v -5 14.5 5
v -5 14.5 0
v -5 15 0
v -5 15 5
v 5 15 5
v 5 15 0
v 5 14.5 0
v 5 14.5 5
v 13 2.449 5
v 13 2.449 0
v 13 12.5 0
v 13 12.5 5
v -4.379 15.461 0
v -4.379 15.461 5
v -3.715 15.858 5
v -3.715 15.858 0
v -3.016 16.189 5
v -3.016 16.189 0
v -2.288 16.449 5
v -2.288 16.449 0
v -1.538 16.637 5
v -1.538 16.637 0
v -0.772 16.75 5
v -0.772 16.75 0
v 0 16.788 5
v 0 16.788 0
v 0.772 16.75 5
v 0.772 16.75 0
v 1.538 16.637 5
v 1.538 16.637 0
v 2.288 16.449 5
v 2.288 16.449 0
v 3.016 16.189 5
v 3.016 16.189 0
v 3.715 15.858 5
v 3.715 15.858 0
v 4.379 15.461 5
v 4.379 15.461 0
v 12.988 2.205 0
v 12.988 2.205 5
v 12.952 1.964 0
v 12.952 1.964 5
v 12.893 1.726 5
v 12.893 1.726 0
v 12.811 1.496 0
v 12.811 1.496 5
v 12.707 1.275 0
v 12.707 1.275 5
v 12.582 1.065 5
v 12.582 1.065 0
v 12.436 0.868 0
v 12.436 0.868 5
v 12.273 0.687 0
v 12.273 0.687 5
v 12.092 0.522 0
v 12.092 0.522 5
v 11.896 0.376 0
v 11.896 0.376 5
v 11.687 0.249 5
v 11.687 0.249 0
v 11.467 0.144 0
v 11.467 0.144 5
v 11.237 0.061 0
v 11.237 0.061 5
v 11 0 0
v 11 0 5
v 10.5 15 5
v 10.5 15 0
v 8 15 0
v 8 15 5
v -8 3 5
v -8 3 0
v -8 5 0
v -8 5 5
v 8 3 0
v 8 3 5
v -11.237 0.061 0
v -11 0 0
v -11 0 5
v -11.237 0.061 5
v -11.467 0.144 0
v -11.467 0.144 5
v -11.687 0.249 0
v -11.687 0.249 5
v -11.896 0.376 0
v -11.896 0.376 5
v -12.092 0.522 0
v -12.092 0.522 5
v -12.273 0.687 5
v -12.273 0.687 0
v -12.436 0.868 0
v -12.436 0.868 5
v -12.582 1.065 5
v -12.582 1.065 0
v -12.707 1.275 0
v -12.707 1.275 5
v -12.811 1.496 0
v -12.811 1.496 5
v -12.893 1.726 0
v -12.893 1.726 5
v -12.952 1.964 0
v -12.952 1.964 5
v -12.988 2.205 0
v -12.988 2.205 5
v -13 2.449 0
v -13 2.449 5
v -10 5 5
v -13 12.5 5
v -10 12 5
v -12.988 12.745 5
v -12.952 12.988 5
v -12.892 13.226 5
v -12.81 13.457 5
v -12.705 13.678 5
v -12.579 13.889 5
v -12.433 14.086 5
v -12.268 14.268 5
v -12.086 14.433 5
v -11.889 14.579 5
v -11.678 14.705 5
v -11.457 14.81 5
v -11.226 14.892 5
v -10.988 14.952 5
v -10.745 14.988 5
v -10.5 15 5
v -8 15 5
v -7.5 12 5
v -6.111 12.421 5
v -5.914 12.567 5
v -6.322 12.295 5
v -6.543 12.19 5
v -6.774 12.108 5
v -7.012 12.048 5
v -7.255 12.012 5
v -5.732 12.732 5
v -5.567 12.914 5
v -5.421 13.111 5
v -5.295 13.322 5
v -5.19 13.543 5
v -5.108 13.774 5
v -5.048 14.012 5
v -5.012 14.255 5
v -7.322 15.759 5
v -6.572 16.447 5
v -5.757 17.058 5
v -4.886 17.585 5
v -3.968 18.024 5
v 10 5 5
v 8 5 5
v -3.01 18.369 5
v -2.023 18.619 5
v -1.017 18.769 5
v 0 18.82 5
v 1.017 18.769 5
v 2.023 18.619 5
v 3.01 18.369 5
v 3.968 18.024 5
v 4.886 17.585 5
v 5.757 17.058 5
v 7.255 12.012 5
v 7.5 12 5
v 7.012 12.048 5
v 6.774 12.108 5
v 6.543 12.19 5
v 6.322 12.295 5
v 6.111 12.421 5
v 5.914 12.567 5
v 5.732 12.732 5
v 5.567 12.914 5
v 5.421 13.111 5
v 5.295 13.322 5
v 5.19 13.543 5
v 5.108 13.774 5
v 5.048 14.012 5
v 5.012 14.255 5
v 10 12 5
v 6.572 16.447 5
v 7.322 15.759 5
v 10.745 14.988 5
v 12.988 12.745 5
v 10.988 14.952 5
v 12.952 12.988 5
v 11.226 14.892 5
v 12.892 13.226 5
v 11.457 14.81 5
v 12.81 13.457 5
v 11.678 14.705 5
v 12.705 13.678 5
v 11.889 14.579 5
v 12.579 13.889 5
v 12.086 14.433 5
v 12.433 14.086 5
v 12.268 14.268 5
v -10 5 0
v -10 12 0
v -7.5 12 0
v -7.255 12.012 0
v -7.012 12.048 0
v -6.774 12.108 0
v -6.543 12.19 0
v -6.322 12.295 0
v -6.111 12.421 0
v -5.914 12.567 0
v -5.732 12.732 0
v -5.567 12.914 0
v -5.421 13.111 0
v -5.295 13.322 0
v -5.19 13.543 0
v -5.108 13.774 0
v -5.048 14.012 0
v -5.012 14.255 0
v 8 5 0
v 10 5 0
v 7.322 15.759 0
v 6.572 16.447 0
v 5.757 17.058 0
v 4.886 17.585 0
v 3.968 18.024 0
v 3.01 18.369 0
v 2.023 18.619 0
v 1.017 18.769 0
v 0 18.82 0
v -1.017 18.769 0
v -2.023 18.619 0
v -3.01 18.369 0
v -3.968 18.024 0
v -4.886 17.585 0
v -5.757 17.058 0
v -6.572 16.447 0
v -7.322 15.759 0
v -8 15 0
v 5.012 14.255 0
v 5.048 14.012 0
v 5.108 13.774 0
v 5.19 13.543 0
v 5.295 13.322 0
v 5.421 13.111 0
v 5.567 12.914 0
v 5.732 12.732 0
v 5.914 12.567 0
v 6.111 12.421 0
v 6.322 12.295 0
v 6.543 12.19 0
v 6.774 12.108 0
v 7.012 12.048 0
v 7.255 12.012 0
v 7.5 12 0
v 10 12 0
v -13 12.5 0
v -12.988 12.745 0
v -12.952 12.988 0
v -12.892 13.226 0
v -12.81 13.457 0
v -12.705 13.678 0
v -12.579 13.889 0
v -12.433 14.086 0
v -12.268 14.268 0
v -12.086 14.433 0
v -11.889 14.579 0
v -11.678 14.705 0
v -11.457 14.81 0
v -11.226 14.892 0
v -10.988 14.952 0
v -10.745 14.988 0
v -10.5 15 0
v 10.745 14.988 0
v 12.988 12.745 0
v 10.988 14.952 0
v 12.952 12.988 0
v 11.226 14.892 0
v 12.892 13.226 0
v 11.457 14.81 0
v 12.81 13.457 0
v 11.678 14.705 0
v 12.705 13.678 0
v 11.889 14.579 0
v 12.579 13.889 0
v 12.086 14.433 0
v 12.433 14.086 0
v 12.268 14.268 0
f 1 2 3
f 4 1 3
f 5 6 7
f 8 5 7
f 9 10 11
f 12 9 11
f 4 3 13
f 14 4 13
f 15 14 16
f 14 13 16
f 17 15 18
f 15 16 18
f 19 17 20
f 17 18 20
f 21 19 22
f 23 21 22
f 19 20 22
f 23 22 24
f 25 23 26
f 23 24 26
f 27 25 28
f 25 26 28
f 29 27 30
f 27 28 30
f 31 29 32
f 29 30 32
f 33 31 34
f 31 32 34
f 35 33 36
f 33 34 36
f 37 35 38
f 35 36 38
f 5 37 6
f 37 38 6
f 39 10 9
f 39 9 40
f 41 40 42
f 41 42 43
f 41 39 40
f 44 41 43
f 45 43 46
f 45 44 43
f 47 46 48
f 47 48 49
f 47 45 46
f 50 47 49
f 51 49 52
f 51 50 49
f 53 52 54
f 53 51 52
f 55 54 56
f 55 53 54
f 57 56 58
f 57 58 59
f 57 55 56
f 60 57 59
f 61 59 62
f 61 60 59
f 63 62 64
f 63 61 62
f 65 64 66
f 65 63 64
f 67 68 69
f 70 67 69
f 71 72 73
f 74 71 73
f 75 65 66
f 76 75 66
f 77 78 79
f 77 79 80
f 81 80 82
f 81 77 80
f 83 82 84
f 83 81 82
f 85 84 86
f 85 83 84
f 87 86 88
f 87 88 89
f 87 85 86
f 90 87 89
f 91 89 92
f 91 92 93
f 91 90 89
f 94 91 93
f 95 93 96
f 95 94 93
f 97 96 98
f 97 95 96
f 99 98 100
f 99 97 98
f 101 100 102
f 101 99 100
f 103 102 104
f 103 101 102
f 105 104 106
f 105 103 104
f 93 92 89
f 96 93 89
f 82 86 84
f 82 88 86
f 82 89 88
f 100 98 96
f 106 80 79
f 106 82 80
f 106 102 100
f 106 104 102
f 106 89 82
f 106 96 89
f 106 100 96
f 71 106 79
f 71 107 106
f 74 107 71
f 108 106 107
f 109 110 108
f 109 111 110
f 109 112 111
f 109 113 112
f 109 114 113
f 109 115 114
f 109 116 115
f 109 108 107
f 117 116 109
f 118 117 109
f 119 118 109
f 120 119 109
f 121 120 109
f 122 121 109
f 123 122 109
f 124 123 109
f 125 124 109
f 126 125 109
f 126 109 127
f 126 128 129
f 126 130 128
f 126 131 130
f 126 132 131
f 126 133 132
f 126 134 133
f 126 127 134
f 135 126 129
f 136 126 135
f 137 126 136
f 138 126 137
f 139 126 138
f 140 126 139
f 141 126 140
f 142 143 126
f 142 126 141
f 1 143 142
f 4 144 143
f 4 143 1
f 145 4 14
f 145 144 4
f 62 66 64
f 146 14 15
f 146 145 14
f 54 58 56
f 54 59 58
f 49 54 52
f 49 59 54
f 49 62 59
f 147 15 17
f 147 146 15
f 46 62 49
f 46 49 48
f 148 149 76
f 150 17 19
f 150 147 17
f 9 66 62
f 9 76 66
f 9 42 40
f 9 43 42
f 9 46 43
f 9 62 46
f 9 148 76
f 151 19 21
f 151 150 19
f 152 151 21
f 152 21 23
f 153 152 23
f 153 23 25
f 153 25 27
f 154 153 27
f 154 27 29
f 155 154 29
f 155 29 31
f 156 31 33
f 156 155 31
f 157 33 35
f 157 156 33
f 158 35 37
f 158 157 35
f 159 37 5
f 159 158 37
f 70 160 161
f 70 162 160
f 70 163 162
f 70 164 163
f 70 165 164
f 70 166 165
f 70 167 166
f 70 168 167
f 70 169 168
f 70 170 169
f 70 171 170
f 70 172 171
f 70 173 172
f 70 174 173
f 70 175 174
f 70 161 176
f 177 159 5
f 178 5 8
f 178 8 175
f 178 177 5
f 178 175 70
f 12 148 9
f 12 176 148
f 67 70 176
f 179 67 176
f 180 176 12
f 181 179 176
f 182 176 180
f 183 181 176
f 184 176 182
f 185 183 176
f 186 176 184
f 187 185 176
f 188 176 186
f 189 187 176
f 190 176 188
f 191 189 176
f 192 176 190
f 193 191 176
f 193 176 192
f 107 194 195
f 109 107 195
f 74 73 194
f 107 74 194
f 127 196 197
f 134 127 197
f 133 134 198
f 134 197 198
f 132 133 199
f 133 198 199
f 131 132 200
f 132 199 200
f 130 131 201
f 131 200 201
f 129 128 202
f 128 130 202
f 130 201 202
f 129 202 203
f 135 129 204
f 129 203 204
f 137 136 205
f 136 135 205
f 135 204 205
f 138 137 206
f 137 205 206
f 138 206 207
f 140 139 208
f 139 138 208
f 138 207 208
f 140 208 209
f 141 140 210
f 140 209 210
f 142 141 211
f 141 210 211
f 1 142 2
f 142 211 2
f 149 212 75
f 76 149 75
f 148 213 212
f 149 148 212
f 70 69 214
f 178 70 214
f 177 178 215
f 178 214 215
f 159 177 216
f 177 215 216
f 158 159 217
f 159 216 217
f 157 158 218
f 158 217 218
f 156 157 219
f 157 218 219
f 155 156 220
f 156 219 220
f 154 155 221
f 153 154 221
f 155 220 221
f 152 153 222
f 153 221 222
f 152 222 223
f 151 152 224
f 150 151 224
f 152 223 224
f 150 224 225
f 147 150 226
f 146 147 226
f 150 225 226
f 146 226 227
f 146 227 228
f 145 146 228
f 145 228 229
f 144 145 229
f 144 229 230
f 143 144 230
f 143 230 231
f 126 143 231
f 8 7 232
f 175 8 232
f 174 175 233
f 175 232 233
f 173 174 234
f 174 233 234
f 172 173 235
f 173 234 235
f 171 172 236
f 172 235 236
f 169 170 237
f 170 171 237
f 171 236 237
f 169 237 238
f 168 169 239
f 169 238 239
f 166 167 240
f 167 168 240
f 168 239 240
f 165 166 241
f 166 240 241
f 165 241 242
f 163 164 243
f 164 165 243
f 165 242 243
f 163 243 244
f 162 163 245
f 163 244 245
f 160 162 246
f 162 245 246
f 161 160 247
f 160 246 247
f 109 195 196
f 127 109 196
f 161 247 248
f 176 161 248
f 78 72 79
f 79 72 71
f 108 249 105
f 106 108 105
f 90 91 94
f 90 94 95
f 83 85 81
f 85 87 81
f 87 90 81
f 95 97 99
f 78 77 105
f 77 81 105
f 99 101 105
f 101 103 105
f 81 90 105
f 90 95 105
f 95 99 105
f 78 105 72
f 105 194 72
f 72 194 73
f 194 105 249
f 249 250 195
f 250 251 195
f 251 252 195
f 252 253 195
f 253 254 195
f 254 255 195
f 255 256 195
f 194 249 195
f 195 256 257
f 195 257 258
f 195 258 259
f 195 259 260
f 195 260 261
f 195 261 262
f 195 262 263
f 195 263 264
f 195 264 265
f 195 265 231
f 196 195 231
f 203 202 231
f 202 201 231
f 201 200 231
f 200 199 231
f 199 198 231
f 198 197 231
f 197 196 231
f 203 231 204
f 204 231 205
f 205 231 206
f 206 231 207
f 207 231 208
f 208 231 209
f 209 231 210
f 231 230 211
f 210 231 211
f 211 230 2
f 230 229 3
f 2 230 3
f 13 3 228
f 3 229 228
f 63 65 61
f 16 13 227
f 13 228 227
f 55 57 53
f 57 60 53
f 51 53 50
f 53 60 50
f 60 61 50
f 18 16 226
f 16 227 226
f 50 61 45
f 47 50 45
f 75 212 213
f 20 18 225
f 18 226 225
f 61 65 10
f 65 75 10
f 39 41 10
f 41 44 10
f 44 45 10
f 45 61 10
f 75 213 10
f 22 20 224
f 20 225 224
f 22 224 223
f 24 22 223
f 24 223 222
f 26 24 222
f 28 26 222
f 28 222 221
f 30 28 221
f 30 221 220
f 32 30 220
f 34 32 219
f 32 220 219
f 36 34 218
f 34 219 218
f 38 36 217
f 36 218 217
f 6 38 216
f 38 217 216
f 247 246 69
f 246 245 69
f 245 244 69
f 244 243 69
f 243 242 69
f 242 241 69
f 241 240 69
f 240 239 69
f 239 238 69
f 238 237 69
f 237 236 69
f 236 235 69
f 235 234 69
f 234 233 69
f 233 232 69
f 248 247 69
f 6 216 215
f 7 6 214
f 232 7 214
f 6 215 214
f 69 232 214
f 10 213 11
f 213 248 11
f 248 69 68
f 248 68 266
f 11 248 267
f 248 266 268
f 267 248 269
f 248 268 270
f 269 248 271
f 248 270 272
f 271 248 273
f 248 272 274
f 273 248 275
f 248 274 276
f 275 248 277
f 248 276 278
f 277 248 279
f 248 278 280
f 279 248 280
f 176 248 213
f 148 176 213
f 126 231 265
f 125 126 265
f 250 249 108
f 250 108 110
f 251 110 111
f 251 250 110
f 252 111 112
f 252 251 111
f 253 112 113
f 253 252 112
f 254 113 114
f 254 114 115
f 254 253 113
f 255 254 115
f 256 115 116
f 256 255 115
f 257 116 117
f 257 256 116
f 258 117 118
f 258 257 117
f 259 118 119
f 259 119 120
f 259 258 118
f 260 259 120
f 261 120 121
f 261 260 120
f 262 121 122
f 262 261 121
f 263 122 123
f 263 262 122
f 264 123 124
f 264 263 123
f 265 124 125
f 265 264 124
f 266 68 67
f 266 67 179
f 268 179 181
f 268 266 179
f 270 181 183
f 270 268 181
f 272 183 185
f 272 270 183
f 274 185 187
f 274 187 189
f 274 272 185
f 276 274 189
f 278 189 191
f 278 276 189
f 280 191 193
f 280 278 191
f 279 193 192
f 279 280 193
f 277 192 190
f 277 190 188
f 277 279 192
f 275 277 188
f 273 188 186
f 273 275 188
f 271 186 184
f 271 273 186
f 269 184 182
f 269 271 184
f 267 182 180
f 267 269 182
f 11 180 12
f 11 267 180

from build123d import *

# Parameters (mm, degrees)
F1_DEPTH    = 5
F2_SIZE     = 3
F3_T1_DEPTH = 17.2474487139
F3_T3_DEPTH = 17.5


# Not quite as in the source:
# - a fillet or chamfer that OpenCascade refuses, or shapes differently, is made with other operations: its cross-section is extruded or revolved along the edge and cut away or added
# - a feature names something its author has since deleted; it is built from what else it names


with BuildPart() as f1:
    # F0 (on Top) → F1 (new body)
    with BuildSketch(Plane.XY):
        with BuildLine():
            Line((-13, 12), (-13, 0))
            Line((-13, 0), (-10, 0))
            Line((-10, 0), (-8, 0))
            Line((-8, 0), (-8, 5))
            Line((-8, 5), (-10, 5))
            Line((-10, 5), (-10, 12))
            Line((-10, 12), (-5, 12))
            Line((-5, 12), (-5, 15))
            ThreePointArc((-5, 15), (0, 16.7884008853), (5, 15))
            Line((5, 15), (5, 12))
            Line((5, 12), (10, 12))
            Line((10, 12), (10, 5))
            Line((10, 5), (8, 5))
            Line((8, 5), (8, 0))
            Line((8, 0), (10, 0))
            Line((10, 0), (13, 0))
            Line((13, 0), (13, 15))
            Line((13, 15), (10, 15))
            Line((10, 15), (8, 15))
            ThreePointArc((8, 15), (0, 18.8196946698), (-8, 15))
            Line((-8, 15), (-10, 15))
            Line((-10, 15), (-13, 15))
            Line((-13, 15), (-13, 12))
        make_face()
    extrude(amount=F1_DEPTH)

    # F2
    f2_edges = [f1.edges().sort_by_distance(p)[0] for p in [
        (-8, 0, 2.5),
        (8, 0, 2.5),
    ]]
    chamfer(f2_edges, length=F2_SIZE)

    # F3: fillet of radius 2.5 on 6 edges, made by hand

    # F3_s2 → F3_t1 (cut)
    with BuildSketch(Plane.XY.offset(-6.123724357)):
        with BuildLine():
            ThreePointArc((-11, 0), (-12.4364916731, 0.8683509127), (-13, 2.4494897428))
            Line((-13, 2.4494897428), (-13, 0))
            Line((-13, 0), (-11, 0))
        make_face()
        with BuildLine():
            ThreePointArc((13, 2.4494897428), (12.4364916731, 0.8683509127), (11, 0))
            Line((11, 0), (13, 0))
            Line((13, 0), (13, 2.4494897428))
        make_face()
    extrude(amount=F3_T1_DEPTH, mode=Mode.SUBTRACT)

    # F3_s4 → F3_t3 (cut)
    with BuildSketch(Plane.XY.offset(-6.25)):
        with BuildLine():
            ThreePointArc((-13, 12.5), (-12.267766953, 14.267766953), (-10.5, 15))
            Line((-10.5, 15), (-13, 15))
            Line((-13, 15), (-13, 12.5))
        make_face()
        with BuildLine():
            ThreePointArc((10.5, 15), (12.267766953, 14.267766953), (13, 12.5))
            Line((13, 12.5), (13, 15))
            Line((13, 15), (10.5, 15))
        make_face()
        with BuildLine():
            ThreePointArc((-7.5, 12), (-5.732233047, 12.732233047), (-5, 14.5))
            Line((-5, 14.5), (-5, 12))
            Line((-5, 12), (-7.5, 12))
        make_face()
        with BuildLine():
            ThreePointArc((5, 14.5), (5.732233047, 12.732233047), (7.5, 12))
            Line((7.5, 12), (5, 12))
            Line((5, 12), (5, 14.5))
        make_face()
    extrude(amount=F3_T3_DEPTH, mode=Mode.SUBTRACT)


solid = f1.part
